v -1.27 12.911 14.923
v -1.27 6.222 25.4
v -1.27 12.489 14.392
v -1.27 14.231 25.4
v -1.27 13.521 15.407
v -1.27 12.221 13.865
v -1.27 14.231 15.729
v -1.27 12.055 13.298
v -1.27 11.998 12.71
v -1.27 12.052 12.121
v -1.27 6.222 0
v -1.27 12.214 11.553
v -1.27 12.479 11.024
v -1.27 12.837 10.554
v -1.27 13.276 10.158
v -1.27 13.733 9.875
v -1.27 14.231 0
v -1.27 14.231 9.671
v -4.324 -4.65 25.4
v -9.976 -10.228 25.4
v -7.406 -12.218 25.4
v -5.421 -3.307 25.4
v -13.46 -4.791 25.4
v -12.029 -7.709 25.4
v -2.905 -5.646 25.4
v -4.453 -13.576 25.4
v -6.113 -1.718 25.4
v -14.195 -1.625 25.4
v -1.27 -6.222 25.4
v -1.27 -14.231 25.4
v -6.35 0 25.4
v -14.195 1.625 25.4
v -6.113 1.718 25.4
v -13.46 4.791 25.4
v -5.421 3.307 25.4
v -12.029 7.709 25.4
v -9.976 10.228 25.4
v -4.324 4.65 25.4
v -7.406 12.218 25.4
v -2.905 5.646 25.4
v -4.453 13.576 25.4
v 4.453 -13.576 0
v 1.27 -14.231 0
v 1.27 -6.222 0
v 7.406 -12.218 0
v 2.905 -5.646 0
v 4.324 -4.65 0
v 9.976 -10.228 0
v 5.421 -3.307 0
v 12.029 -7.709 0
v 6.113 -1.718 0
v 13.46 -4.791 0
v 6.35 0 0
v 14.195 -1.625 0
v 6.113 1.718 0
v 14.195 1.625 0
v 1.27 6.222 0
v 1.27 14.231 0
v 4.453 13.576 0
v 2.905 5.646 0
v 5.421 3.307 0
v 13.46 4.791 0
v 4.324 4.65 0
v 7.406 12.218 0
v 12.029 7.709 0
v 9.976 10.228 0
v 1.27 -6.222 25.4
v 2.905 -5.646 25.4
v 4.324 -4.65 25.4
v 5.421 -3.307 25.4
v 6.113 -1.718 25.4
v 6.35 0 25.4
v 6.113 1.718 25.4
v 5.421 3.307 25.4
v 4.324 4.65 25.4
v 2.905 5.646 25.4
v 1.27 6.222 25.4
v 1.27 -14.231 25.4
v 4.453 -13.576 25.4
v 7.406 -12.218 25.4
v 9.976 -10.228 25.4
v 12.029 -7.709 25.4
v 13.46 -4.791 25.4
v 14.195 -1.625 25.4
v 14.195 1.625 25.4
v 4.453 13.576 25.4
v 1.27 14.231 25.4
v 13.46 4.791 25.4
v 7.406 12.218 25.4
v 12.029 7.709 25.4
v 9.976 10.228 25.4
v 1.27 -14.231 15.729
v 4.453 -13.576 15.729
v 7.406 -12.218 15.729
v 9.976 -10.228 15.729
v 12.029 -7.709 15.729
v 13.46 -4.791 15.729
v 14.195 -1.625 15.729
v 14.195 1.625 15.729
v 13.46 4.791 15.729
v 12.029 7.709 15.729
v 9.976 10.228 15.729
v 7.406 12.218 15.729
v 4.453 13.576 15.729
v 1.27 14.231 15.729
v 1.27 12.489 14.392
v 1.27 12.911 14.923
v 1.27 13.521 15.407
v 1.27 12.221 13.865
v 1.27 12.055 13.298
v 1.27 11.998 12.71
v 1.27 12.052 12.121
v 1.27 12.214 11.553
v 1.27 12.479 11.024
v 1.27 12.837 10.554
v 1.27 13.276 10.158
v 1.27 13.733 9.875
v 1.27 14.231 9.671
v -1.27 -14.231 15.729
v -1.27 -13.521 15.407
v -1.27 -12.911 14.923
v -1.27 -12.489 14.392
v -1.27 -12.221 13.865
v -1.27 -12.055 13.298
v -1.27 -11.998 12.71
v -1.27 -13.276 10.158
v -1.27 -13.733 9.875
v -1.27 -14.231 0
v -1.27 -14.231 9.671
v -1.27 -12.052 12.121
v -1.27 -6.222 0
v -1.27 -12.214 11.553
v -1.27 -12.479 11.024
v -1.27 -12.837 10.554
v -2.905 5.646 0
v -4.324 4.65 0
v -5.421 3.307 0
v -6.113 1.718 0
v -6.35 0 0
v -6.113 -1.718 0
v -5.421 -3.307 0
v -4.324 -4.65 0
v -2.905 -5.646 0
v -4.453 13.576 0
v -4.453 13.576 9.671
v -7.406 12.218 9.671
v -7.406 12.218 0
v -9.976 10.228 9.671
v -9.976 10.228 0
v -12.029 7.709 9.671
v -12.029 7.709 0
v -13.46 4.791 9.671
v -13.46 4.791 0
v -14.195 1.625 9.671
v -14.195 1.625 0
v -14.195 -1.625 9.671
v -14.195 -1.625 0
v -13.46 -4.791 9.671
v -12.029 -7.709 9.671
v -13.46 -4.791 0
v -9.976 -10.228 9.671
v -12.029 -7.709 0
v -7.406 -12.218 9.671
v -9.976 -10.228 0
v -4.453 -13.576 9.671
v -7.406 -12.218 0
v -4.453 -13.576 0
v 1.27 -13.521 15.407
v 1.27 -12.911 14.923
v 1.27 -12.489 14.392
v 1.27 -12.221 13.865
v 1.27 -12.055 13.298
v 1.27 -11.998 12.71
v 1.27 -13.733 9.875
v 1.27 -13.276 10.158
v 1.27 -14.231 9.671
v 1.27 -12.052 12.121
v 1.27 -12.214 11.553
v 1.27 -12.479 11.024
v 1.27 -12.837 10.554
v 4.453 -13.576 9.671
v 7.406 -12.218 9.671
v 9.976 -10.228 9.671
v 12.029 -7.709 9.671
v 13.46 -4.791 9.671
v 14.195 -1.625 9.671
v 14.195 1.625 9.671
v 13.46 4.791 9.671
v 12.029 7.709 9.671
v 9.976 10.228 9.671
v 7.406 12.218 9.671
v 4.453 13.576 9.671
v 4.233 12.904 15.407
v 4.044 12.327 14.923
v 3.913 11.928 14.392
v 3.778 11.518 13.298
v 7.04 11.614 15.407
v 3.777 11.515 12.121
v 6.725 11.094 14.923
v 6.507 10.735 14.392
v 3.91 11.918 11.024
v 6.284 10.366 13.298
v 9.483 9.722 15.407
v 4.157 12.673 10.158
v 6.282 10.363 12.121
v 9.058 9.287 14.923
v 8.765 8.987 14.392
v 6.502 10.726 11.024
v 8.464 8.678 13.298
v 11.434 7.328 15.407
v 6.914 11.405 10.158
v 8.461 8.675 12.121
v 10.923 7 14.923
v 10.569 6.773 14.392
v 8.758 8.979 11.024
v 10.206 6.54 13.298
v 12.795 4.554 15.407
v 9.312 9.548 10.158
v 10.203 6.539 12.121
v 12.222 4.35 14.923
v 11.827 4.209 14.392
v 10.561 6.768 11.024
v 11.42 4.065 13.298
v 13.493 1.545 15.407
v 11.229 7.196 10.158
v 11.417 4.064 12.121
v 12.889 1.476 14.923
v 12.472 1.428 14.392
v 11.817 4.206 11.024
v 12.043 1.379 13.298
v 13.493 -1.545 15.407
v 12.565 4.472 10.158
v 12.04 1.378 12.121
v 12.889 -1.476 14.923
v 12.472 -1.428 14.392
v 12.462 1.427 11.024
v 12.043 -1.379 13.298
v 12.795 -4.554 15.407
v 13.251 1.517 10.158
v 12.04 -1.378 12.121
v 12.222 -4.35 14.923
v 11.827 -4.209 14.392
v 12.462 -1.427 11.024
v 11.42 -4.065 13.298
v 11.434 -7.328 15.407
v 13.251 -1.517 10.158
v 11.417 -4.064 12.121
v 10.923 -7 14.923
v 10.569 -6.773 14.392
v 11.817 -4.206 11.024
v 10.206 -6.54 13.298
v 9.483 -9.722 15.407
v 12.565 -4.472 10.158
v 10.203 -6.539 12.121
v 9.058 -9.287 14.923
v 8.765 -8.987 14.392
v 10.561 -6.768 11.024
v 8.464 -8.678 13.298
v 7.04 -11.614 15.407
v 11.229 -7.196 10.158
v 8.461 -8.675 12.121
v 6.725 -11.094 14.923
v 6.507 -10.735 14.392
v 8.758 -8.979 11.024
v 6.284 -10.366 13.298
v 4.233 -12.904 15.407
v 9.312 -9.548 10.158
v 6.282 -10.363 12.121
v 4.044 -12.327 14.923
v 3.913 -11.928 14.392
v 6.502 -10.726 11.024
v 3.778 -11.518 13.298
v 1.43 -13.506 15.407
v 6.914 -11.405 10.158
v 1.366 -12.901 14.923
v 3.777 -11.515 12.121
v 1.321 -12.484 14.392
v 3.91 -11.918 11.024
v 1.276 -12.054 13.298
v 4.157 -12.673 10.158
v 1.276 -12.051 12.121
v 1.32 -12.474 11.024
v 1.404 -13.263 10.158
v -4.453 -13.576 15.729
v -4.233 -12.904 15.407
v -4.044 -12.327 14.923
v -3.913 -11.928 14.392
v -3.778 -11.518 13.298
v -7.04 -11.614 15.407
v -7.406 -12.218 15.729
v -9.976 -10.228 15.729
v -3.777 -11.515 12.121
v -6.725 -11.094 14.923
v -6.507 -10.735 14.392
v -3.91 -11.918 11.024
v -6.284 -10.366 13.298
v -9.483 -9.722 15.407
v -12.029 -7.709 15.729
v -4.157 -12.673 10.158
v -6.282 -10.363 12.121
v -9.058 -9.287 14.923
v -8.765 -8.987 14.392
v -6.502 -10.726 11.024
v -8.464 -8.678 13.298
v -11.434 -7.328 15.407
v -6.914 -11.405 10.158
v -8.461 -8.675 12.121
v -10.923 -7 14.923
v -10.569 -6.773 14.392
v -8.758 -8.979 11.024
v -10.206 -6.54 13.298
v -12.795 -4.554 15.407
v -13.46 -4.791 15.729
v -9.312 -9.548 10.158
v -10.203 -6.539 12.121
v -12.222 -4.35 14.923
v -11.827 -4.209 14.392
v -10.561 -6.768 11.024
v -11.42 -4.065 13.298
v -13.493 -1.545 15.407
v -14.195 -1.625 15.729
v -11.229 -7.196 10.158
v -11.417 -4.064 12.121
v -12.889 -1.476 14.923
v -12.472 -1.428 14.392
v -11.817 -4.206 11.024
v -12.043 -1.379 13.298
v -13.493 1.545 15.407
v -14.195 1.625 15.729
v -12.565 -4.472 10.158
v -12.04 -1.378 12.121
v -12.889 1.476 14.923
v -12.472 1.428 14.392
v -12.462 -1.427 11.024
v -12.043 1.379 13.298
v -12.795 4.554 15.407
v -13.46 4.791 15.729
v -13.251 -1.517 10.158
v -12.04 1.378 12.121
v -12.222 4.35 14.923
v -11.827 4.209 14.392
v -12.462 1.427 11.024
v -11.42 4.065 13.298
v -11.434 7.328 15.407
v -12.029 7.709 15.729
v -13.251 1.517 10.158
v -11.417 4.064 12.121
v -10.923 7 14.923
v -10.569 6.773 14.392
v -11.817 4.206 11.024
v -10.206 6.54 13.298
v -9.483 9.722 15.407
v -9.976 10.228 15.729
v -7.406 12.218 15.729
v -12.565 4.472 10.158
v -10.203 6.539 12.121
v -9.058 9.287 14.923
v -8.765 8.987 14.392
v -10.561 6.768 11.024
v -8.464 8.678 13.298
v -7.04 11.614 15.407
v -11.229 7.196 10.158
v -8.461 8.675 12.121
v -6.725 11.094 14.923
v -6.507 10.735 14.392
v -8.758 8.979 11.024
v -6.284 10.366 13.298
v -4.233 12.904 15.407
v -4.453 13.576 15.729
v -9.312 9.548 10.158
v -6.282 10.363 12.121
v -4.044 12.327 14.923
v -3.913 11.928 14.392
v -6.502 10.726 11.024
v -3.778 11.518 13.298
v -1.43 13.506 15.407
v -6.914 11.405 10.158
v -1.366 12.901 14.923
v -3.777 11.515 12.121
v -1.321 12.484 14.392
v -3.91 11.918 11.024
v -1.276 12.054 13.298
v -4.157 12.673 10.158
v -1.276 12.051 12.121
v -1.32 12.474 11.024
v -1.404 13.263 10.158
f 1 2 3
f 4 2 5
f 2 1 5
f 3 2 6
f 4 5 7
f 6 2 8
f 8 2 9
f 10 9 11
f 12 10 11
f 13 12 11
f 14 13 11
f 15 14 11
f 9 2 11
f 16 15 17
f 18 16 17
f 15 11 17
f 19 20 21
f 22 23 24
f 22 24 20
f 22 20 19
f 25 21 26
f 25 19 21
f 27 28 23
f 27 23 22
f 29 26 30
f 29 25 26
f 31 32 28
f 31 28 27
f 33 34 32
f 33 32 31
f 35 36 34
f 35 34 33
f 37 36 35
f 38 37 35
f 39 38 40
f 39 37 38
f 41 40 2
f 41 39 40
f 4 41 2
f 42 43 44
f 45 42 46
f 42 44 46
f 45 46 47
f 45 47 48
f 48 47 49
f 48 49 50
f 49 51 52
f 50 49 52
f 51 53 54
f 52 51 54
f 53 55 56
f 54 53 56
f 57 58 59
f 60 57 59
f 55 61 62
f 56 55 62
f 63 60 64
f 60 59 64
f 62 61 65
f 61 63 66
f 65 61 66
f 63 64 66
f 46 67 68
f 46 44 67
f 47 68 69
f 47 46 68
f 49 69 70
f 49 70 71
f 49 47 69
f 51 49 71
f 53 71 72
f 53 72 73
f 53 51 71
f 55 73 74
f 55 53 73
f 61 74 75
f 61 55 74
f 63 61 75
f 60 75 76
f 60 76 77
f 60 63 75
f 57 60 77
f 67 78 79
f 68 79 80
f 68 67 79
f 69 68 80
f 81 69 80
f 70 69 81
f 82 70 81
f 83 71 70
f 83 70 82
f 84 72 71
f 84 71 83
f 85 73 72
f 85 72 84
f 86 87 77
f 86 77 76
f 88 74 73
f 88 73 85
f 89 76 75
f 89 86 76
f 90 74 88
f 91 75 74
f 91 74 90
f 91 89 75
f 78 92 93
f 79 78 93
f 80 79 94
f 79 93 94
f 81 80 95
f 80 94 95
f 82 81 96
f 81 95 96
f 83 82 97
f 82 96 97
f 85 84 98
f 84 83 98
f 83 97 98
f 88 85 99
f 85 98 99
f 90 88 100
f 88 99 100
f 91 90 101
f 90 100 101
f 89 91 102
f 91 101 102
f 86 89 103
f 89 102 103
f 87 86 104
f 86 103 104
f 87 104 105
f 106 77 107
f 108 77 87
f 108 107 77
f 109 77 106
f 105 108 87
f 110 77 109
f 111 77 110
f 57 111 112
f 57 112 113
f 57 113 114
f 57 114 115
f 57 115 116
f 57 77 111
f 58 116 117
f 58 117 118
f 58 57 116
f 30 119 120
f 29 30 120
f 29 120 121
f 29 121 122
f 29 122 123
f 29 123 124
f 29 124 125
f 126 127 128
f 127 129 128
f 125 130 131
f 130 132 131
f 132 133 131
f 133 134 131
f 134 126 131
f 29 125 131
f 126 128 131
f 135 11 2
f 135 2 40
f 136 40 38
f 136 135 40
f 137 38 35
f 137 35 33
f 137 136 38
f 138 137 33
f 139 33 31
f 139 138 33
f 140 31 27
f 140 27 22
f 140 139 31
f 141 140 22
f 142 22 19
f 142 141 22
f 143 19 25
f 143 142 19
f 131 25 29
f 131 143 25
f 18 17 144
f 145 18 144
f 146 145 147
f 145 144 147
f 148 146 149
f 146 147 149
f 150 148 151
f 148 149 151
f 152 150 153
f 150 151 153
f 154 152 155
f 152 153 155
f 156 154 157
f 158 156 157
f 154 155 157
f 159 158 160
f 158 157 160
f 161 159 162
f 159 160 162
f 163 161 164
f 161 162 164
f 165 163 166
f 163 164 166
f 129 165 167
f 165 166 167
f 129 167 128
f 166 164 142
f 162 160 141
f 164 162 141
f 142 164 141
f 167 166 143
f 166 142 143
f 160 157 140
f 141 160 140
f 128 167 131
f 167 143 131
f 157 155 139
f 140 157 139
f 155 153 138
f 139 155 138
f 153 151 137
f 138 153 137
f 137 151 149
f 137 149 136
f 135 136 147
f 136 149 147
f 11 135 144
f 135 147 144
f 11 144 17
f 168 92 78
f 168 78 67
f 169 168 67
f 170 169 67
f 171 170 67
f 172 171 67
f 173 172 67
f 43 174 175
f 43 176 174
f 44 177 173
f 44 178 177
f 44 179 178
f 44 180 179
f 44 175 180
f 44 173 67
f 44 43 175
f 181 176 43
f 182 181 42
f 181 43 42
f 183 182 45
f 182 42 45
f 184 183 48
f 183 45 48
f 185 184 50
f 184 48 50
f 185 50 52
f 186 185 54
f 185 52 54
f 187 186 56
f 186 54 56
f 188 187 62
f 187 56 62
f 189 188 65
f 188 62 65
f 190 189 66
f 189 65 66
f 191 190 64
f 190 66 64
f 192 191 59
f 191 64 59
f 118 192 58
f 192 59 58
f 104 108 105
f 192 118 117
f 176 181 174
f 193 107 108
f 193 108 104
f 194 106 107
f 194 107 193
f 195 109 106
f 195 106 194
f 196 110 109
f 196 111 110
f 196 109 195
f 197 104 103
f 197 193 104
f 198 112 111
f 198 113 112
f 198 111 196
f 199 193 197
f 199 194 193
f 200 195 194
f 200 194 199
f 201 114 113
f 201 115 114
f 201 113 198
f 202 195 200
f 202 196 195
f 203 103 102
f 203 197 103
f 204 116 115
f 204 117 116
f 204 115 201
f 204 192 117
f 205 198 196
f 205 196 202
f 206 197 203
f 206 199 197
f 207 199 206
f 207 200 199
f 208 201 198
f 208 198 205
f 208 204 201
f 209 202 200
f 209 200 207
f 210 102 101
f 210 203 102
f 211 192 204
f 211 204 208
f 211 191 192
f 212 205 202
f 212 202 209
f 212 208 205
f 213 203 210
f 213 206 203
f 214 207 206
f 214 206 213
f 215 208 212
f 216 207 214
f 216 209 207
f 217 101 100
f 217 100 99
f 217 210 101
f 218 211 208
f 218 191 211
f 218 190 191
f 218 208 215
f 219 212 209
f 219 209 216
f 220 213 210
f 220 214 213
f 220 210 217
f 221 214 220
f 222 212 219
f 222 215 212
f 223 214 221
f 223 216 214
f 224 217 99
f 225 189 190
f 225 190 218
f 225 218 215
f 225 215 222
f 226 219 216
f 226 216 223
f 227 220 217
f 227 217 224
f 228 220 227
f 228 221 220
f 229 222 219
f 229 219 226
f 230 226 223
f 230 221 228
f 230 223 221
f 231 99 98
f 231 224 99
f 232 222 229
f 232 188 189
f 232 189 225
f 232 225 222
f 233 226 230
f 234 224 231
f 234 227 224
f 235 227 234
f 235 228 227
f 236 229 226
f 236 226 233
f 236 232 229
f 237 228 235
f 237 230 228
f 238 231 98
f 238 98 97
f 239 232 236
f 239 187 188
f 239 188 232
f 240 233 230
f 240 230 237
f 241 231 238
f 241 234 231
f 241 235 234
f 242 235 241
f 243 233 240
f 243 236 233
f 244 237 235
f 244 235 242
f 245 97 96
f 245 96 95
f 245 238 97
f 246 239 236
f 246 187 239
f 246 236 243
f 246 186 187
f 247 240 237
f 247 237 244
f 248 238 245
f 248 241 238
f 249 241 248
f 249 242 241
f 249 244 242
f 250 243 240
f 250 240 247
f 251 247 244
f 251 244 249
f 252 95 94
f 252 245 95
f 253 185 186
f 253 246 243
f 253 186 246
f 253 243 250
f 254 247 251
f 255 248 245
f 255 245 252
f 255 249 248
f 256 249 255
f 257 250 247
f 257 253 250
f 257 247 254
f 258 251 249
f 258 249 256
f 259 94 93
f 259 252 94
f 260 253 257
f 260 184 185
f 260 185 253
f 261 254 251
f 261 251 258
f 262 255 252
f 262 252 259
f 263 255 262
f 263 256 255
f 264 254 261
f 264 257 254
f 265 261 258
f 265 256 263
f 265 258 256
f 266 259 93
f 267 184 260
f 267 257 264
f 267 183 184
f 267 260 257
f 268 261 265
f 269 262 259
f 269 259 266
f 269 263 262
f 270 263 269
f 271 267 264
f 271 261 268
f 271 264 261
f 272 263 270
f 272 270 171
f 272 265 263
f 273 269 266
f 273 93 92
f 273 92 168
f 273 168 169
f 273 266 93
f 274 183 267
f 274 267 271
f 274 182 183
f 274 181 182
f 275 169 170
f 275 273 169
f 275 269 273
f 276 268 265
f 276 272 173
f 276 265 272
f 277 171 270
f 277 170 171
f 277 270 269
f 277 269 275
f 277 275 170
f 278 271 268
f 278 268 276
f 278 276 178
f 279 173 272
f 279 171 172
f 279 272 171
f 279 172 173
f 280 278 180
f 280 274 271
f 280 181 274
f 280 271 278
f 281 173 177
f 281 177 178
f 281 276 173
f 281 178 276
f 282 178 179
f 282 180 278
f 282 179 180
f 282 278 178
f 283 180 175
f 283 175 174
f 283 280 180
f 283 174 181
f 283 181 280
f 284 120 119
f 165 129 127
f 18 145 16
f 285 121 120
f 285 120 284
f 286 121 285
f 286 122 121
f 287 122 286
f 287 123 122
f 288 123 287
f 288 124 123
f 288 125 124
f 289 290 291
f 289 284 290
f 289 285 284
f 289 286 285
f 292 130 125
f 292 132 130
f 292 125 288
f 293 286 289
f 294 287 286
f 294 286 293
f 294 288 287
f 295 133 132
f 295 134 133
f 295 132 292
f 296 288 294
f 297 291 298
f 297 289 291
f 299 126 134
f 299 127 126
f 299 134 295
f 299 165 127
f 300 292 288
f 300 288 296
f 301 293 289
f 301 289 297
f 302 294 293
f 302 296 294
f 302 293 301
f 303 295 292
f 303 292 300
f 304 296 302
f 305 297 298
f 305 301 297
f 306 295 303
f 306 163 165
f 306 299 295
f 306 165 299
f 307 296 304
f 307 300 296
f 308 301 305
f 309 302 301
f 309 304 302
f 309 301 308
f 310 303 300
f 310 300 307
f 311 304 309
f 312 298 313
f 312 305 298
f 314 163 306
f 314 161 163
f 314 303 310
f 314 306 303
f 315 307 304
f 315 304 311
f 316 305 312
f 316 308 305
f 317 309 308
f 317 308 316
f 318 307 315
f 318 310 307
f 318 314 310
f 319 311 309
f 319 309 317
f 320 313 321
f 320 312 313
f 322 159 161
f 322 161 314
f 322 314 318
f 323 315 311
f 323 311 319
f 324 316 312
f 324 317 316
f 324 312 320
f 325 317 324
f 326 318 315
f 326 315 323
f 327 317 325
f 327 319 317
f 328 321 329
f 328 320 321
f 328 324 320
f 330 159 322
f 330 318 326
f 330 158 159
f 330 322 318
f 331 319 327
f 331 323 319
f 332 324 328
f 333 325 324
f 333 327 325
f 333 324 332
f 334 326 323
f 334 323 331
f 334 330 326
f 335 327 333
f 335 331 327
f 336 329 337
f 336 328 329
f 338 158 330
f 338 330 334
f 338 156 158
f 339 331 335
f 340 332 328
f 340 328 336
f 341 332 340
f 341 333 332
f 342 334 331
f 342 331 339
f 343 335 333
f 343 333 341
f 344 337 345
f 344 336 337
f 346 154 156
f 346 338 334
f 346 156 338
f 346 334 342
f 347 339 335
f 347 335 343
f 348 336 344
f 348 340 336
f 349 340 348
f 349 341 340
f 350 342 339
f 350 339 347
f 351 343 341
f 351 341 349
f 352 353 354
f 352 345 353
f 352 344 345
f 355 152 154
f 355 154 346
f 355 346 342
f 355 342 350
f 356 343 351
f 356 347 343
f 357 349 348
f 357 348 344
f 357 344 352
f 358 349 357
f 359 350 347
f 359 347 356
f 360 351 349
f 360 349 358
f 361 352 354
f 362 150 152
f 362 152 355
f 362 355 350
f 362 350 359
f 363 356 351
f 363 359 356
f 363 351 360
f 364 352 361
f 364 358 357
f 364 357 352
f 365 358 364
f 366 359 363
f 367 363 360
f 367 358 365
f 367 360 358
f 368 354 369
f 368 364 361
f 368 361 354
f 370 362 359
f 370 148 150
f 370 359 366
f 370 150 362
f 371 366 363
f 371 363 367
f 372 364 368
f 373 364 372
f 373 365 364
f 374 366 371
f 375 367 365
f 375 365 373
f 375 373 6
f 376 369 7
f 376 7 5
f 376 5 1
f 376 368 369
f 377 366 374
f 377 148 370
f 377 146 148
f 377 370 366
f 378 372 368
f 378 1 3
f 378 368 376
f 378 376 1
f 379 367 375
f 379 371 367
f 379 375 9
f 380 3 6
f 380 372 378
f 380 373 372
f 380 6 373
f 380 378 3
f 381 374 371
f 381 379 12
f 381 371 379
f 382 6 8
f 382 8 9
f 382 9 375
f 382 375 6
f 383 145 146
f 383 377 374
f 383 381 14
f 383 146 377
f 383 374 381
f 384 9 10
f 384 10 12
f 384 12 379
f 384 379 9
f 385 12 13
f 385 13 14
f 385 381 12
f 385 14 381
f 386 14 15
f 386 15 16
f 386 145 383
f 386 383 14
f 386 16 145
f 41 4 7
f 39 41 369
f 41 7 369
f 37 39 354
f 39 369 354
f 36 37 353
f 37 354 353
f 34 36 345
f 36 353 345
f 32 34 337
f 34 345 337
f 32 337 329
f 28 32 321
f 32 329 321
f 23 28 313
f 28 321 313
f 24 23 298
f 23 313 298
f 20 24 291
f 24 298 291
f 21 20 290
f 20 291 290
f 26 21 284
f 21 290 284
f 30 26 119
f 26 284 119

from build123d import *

# Parameters (mm, degrees)
F0_R     = 14.2875
F0_R_2   = 6.35
F1_DEPTH = 25.4
F2_R     = 3.175
F4_W     = 2.54
F4_H     = 31.75
F5_DEPTH = 25.4


with BuildPart() as f1:
    # F0 (on Top) → F1 (new body)
    with BuildSketch(Plane.XY):
        Circle(F0_R)
        Circle(F0_R_2, mode=Mode.SUBTRACT)
    extrude(amount=F1_DEPTH)

    # F2 (on Right) → F3 (revolve, cut)
    with BuildSketch(Plane.YZ):
        with Locations((15.24, 12.7)):
            Circle(F2_R)
    revolve(axis=Axis((0, 0, 0), (0, 0, -1)), mode=Mode.SUBTRACT)

    # F4 (on Top) → F5 (cut)
    with BuildSketch(Plane.XY):
        Rectangle(F4_W, F4_H)
    extrude(amount=F5_DEPTH, mode=Mode.SUBTRACT)


solid = f1.part
